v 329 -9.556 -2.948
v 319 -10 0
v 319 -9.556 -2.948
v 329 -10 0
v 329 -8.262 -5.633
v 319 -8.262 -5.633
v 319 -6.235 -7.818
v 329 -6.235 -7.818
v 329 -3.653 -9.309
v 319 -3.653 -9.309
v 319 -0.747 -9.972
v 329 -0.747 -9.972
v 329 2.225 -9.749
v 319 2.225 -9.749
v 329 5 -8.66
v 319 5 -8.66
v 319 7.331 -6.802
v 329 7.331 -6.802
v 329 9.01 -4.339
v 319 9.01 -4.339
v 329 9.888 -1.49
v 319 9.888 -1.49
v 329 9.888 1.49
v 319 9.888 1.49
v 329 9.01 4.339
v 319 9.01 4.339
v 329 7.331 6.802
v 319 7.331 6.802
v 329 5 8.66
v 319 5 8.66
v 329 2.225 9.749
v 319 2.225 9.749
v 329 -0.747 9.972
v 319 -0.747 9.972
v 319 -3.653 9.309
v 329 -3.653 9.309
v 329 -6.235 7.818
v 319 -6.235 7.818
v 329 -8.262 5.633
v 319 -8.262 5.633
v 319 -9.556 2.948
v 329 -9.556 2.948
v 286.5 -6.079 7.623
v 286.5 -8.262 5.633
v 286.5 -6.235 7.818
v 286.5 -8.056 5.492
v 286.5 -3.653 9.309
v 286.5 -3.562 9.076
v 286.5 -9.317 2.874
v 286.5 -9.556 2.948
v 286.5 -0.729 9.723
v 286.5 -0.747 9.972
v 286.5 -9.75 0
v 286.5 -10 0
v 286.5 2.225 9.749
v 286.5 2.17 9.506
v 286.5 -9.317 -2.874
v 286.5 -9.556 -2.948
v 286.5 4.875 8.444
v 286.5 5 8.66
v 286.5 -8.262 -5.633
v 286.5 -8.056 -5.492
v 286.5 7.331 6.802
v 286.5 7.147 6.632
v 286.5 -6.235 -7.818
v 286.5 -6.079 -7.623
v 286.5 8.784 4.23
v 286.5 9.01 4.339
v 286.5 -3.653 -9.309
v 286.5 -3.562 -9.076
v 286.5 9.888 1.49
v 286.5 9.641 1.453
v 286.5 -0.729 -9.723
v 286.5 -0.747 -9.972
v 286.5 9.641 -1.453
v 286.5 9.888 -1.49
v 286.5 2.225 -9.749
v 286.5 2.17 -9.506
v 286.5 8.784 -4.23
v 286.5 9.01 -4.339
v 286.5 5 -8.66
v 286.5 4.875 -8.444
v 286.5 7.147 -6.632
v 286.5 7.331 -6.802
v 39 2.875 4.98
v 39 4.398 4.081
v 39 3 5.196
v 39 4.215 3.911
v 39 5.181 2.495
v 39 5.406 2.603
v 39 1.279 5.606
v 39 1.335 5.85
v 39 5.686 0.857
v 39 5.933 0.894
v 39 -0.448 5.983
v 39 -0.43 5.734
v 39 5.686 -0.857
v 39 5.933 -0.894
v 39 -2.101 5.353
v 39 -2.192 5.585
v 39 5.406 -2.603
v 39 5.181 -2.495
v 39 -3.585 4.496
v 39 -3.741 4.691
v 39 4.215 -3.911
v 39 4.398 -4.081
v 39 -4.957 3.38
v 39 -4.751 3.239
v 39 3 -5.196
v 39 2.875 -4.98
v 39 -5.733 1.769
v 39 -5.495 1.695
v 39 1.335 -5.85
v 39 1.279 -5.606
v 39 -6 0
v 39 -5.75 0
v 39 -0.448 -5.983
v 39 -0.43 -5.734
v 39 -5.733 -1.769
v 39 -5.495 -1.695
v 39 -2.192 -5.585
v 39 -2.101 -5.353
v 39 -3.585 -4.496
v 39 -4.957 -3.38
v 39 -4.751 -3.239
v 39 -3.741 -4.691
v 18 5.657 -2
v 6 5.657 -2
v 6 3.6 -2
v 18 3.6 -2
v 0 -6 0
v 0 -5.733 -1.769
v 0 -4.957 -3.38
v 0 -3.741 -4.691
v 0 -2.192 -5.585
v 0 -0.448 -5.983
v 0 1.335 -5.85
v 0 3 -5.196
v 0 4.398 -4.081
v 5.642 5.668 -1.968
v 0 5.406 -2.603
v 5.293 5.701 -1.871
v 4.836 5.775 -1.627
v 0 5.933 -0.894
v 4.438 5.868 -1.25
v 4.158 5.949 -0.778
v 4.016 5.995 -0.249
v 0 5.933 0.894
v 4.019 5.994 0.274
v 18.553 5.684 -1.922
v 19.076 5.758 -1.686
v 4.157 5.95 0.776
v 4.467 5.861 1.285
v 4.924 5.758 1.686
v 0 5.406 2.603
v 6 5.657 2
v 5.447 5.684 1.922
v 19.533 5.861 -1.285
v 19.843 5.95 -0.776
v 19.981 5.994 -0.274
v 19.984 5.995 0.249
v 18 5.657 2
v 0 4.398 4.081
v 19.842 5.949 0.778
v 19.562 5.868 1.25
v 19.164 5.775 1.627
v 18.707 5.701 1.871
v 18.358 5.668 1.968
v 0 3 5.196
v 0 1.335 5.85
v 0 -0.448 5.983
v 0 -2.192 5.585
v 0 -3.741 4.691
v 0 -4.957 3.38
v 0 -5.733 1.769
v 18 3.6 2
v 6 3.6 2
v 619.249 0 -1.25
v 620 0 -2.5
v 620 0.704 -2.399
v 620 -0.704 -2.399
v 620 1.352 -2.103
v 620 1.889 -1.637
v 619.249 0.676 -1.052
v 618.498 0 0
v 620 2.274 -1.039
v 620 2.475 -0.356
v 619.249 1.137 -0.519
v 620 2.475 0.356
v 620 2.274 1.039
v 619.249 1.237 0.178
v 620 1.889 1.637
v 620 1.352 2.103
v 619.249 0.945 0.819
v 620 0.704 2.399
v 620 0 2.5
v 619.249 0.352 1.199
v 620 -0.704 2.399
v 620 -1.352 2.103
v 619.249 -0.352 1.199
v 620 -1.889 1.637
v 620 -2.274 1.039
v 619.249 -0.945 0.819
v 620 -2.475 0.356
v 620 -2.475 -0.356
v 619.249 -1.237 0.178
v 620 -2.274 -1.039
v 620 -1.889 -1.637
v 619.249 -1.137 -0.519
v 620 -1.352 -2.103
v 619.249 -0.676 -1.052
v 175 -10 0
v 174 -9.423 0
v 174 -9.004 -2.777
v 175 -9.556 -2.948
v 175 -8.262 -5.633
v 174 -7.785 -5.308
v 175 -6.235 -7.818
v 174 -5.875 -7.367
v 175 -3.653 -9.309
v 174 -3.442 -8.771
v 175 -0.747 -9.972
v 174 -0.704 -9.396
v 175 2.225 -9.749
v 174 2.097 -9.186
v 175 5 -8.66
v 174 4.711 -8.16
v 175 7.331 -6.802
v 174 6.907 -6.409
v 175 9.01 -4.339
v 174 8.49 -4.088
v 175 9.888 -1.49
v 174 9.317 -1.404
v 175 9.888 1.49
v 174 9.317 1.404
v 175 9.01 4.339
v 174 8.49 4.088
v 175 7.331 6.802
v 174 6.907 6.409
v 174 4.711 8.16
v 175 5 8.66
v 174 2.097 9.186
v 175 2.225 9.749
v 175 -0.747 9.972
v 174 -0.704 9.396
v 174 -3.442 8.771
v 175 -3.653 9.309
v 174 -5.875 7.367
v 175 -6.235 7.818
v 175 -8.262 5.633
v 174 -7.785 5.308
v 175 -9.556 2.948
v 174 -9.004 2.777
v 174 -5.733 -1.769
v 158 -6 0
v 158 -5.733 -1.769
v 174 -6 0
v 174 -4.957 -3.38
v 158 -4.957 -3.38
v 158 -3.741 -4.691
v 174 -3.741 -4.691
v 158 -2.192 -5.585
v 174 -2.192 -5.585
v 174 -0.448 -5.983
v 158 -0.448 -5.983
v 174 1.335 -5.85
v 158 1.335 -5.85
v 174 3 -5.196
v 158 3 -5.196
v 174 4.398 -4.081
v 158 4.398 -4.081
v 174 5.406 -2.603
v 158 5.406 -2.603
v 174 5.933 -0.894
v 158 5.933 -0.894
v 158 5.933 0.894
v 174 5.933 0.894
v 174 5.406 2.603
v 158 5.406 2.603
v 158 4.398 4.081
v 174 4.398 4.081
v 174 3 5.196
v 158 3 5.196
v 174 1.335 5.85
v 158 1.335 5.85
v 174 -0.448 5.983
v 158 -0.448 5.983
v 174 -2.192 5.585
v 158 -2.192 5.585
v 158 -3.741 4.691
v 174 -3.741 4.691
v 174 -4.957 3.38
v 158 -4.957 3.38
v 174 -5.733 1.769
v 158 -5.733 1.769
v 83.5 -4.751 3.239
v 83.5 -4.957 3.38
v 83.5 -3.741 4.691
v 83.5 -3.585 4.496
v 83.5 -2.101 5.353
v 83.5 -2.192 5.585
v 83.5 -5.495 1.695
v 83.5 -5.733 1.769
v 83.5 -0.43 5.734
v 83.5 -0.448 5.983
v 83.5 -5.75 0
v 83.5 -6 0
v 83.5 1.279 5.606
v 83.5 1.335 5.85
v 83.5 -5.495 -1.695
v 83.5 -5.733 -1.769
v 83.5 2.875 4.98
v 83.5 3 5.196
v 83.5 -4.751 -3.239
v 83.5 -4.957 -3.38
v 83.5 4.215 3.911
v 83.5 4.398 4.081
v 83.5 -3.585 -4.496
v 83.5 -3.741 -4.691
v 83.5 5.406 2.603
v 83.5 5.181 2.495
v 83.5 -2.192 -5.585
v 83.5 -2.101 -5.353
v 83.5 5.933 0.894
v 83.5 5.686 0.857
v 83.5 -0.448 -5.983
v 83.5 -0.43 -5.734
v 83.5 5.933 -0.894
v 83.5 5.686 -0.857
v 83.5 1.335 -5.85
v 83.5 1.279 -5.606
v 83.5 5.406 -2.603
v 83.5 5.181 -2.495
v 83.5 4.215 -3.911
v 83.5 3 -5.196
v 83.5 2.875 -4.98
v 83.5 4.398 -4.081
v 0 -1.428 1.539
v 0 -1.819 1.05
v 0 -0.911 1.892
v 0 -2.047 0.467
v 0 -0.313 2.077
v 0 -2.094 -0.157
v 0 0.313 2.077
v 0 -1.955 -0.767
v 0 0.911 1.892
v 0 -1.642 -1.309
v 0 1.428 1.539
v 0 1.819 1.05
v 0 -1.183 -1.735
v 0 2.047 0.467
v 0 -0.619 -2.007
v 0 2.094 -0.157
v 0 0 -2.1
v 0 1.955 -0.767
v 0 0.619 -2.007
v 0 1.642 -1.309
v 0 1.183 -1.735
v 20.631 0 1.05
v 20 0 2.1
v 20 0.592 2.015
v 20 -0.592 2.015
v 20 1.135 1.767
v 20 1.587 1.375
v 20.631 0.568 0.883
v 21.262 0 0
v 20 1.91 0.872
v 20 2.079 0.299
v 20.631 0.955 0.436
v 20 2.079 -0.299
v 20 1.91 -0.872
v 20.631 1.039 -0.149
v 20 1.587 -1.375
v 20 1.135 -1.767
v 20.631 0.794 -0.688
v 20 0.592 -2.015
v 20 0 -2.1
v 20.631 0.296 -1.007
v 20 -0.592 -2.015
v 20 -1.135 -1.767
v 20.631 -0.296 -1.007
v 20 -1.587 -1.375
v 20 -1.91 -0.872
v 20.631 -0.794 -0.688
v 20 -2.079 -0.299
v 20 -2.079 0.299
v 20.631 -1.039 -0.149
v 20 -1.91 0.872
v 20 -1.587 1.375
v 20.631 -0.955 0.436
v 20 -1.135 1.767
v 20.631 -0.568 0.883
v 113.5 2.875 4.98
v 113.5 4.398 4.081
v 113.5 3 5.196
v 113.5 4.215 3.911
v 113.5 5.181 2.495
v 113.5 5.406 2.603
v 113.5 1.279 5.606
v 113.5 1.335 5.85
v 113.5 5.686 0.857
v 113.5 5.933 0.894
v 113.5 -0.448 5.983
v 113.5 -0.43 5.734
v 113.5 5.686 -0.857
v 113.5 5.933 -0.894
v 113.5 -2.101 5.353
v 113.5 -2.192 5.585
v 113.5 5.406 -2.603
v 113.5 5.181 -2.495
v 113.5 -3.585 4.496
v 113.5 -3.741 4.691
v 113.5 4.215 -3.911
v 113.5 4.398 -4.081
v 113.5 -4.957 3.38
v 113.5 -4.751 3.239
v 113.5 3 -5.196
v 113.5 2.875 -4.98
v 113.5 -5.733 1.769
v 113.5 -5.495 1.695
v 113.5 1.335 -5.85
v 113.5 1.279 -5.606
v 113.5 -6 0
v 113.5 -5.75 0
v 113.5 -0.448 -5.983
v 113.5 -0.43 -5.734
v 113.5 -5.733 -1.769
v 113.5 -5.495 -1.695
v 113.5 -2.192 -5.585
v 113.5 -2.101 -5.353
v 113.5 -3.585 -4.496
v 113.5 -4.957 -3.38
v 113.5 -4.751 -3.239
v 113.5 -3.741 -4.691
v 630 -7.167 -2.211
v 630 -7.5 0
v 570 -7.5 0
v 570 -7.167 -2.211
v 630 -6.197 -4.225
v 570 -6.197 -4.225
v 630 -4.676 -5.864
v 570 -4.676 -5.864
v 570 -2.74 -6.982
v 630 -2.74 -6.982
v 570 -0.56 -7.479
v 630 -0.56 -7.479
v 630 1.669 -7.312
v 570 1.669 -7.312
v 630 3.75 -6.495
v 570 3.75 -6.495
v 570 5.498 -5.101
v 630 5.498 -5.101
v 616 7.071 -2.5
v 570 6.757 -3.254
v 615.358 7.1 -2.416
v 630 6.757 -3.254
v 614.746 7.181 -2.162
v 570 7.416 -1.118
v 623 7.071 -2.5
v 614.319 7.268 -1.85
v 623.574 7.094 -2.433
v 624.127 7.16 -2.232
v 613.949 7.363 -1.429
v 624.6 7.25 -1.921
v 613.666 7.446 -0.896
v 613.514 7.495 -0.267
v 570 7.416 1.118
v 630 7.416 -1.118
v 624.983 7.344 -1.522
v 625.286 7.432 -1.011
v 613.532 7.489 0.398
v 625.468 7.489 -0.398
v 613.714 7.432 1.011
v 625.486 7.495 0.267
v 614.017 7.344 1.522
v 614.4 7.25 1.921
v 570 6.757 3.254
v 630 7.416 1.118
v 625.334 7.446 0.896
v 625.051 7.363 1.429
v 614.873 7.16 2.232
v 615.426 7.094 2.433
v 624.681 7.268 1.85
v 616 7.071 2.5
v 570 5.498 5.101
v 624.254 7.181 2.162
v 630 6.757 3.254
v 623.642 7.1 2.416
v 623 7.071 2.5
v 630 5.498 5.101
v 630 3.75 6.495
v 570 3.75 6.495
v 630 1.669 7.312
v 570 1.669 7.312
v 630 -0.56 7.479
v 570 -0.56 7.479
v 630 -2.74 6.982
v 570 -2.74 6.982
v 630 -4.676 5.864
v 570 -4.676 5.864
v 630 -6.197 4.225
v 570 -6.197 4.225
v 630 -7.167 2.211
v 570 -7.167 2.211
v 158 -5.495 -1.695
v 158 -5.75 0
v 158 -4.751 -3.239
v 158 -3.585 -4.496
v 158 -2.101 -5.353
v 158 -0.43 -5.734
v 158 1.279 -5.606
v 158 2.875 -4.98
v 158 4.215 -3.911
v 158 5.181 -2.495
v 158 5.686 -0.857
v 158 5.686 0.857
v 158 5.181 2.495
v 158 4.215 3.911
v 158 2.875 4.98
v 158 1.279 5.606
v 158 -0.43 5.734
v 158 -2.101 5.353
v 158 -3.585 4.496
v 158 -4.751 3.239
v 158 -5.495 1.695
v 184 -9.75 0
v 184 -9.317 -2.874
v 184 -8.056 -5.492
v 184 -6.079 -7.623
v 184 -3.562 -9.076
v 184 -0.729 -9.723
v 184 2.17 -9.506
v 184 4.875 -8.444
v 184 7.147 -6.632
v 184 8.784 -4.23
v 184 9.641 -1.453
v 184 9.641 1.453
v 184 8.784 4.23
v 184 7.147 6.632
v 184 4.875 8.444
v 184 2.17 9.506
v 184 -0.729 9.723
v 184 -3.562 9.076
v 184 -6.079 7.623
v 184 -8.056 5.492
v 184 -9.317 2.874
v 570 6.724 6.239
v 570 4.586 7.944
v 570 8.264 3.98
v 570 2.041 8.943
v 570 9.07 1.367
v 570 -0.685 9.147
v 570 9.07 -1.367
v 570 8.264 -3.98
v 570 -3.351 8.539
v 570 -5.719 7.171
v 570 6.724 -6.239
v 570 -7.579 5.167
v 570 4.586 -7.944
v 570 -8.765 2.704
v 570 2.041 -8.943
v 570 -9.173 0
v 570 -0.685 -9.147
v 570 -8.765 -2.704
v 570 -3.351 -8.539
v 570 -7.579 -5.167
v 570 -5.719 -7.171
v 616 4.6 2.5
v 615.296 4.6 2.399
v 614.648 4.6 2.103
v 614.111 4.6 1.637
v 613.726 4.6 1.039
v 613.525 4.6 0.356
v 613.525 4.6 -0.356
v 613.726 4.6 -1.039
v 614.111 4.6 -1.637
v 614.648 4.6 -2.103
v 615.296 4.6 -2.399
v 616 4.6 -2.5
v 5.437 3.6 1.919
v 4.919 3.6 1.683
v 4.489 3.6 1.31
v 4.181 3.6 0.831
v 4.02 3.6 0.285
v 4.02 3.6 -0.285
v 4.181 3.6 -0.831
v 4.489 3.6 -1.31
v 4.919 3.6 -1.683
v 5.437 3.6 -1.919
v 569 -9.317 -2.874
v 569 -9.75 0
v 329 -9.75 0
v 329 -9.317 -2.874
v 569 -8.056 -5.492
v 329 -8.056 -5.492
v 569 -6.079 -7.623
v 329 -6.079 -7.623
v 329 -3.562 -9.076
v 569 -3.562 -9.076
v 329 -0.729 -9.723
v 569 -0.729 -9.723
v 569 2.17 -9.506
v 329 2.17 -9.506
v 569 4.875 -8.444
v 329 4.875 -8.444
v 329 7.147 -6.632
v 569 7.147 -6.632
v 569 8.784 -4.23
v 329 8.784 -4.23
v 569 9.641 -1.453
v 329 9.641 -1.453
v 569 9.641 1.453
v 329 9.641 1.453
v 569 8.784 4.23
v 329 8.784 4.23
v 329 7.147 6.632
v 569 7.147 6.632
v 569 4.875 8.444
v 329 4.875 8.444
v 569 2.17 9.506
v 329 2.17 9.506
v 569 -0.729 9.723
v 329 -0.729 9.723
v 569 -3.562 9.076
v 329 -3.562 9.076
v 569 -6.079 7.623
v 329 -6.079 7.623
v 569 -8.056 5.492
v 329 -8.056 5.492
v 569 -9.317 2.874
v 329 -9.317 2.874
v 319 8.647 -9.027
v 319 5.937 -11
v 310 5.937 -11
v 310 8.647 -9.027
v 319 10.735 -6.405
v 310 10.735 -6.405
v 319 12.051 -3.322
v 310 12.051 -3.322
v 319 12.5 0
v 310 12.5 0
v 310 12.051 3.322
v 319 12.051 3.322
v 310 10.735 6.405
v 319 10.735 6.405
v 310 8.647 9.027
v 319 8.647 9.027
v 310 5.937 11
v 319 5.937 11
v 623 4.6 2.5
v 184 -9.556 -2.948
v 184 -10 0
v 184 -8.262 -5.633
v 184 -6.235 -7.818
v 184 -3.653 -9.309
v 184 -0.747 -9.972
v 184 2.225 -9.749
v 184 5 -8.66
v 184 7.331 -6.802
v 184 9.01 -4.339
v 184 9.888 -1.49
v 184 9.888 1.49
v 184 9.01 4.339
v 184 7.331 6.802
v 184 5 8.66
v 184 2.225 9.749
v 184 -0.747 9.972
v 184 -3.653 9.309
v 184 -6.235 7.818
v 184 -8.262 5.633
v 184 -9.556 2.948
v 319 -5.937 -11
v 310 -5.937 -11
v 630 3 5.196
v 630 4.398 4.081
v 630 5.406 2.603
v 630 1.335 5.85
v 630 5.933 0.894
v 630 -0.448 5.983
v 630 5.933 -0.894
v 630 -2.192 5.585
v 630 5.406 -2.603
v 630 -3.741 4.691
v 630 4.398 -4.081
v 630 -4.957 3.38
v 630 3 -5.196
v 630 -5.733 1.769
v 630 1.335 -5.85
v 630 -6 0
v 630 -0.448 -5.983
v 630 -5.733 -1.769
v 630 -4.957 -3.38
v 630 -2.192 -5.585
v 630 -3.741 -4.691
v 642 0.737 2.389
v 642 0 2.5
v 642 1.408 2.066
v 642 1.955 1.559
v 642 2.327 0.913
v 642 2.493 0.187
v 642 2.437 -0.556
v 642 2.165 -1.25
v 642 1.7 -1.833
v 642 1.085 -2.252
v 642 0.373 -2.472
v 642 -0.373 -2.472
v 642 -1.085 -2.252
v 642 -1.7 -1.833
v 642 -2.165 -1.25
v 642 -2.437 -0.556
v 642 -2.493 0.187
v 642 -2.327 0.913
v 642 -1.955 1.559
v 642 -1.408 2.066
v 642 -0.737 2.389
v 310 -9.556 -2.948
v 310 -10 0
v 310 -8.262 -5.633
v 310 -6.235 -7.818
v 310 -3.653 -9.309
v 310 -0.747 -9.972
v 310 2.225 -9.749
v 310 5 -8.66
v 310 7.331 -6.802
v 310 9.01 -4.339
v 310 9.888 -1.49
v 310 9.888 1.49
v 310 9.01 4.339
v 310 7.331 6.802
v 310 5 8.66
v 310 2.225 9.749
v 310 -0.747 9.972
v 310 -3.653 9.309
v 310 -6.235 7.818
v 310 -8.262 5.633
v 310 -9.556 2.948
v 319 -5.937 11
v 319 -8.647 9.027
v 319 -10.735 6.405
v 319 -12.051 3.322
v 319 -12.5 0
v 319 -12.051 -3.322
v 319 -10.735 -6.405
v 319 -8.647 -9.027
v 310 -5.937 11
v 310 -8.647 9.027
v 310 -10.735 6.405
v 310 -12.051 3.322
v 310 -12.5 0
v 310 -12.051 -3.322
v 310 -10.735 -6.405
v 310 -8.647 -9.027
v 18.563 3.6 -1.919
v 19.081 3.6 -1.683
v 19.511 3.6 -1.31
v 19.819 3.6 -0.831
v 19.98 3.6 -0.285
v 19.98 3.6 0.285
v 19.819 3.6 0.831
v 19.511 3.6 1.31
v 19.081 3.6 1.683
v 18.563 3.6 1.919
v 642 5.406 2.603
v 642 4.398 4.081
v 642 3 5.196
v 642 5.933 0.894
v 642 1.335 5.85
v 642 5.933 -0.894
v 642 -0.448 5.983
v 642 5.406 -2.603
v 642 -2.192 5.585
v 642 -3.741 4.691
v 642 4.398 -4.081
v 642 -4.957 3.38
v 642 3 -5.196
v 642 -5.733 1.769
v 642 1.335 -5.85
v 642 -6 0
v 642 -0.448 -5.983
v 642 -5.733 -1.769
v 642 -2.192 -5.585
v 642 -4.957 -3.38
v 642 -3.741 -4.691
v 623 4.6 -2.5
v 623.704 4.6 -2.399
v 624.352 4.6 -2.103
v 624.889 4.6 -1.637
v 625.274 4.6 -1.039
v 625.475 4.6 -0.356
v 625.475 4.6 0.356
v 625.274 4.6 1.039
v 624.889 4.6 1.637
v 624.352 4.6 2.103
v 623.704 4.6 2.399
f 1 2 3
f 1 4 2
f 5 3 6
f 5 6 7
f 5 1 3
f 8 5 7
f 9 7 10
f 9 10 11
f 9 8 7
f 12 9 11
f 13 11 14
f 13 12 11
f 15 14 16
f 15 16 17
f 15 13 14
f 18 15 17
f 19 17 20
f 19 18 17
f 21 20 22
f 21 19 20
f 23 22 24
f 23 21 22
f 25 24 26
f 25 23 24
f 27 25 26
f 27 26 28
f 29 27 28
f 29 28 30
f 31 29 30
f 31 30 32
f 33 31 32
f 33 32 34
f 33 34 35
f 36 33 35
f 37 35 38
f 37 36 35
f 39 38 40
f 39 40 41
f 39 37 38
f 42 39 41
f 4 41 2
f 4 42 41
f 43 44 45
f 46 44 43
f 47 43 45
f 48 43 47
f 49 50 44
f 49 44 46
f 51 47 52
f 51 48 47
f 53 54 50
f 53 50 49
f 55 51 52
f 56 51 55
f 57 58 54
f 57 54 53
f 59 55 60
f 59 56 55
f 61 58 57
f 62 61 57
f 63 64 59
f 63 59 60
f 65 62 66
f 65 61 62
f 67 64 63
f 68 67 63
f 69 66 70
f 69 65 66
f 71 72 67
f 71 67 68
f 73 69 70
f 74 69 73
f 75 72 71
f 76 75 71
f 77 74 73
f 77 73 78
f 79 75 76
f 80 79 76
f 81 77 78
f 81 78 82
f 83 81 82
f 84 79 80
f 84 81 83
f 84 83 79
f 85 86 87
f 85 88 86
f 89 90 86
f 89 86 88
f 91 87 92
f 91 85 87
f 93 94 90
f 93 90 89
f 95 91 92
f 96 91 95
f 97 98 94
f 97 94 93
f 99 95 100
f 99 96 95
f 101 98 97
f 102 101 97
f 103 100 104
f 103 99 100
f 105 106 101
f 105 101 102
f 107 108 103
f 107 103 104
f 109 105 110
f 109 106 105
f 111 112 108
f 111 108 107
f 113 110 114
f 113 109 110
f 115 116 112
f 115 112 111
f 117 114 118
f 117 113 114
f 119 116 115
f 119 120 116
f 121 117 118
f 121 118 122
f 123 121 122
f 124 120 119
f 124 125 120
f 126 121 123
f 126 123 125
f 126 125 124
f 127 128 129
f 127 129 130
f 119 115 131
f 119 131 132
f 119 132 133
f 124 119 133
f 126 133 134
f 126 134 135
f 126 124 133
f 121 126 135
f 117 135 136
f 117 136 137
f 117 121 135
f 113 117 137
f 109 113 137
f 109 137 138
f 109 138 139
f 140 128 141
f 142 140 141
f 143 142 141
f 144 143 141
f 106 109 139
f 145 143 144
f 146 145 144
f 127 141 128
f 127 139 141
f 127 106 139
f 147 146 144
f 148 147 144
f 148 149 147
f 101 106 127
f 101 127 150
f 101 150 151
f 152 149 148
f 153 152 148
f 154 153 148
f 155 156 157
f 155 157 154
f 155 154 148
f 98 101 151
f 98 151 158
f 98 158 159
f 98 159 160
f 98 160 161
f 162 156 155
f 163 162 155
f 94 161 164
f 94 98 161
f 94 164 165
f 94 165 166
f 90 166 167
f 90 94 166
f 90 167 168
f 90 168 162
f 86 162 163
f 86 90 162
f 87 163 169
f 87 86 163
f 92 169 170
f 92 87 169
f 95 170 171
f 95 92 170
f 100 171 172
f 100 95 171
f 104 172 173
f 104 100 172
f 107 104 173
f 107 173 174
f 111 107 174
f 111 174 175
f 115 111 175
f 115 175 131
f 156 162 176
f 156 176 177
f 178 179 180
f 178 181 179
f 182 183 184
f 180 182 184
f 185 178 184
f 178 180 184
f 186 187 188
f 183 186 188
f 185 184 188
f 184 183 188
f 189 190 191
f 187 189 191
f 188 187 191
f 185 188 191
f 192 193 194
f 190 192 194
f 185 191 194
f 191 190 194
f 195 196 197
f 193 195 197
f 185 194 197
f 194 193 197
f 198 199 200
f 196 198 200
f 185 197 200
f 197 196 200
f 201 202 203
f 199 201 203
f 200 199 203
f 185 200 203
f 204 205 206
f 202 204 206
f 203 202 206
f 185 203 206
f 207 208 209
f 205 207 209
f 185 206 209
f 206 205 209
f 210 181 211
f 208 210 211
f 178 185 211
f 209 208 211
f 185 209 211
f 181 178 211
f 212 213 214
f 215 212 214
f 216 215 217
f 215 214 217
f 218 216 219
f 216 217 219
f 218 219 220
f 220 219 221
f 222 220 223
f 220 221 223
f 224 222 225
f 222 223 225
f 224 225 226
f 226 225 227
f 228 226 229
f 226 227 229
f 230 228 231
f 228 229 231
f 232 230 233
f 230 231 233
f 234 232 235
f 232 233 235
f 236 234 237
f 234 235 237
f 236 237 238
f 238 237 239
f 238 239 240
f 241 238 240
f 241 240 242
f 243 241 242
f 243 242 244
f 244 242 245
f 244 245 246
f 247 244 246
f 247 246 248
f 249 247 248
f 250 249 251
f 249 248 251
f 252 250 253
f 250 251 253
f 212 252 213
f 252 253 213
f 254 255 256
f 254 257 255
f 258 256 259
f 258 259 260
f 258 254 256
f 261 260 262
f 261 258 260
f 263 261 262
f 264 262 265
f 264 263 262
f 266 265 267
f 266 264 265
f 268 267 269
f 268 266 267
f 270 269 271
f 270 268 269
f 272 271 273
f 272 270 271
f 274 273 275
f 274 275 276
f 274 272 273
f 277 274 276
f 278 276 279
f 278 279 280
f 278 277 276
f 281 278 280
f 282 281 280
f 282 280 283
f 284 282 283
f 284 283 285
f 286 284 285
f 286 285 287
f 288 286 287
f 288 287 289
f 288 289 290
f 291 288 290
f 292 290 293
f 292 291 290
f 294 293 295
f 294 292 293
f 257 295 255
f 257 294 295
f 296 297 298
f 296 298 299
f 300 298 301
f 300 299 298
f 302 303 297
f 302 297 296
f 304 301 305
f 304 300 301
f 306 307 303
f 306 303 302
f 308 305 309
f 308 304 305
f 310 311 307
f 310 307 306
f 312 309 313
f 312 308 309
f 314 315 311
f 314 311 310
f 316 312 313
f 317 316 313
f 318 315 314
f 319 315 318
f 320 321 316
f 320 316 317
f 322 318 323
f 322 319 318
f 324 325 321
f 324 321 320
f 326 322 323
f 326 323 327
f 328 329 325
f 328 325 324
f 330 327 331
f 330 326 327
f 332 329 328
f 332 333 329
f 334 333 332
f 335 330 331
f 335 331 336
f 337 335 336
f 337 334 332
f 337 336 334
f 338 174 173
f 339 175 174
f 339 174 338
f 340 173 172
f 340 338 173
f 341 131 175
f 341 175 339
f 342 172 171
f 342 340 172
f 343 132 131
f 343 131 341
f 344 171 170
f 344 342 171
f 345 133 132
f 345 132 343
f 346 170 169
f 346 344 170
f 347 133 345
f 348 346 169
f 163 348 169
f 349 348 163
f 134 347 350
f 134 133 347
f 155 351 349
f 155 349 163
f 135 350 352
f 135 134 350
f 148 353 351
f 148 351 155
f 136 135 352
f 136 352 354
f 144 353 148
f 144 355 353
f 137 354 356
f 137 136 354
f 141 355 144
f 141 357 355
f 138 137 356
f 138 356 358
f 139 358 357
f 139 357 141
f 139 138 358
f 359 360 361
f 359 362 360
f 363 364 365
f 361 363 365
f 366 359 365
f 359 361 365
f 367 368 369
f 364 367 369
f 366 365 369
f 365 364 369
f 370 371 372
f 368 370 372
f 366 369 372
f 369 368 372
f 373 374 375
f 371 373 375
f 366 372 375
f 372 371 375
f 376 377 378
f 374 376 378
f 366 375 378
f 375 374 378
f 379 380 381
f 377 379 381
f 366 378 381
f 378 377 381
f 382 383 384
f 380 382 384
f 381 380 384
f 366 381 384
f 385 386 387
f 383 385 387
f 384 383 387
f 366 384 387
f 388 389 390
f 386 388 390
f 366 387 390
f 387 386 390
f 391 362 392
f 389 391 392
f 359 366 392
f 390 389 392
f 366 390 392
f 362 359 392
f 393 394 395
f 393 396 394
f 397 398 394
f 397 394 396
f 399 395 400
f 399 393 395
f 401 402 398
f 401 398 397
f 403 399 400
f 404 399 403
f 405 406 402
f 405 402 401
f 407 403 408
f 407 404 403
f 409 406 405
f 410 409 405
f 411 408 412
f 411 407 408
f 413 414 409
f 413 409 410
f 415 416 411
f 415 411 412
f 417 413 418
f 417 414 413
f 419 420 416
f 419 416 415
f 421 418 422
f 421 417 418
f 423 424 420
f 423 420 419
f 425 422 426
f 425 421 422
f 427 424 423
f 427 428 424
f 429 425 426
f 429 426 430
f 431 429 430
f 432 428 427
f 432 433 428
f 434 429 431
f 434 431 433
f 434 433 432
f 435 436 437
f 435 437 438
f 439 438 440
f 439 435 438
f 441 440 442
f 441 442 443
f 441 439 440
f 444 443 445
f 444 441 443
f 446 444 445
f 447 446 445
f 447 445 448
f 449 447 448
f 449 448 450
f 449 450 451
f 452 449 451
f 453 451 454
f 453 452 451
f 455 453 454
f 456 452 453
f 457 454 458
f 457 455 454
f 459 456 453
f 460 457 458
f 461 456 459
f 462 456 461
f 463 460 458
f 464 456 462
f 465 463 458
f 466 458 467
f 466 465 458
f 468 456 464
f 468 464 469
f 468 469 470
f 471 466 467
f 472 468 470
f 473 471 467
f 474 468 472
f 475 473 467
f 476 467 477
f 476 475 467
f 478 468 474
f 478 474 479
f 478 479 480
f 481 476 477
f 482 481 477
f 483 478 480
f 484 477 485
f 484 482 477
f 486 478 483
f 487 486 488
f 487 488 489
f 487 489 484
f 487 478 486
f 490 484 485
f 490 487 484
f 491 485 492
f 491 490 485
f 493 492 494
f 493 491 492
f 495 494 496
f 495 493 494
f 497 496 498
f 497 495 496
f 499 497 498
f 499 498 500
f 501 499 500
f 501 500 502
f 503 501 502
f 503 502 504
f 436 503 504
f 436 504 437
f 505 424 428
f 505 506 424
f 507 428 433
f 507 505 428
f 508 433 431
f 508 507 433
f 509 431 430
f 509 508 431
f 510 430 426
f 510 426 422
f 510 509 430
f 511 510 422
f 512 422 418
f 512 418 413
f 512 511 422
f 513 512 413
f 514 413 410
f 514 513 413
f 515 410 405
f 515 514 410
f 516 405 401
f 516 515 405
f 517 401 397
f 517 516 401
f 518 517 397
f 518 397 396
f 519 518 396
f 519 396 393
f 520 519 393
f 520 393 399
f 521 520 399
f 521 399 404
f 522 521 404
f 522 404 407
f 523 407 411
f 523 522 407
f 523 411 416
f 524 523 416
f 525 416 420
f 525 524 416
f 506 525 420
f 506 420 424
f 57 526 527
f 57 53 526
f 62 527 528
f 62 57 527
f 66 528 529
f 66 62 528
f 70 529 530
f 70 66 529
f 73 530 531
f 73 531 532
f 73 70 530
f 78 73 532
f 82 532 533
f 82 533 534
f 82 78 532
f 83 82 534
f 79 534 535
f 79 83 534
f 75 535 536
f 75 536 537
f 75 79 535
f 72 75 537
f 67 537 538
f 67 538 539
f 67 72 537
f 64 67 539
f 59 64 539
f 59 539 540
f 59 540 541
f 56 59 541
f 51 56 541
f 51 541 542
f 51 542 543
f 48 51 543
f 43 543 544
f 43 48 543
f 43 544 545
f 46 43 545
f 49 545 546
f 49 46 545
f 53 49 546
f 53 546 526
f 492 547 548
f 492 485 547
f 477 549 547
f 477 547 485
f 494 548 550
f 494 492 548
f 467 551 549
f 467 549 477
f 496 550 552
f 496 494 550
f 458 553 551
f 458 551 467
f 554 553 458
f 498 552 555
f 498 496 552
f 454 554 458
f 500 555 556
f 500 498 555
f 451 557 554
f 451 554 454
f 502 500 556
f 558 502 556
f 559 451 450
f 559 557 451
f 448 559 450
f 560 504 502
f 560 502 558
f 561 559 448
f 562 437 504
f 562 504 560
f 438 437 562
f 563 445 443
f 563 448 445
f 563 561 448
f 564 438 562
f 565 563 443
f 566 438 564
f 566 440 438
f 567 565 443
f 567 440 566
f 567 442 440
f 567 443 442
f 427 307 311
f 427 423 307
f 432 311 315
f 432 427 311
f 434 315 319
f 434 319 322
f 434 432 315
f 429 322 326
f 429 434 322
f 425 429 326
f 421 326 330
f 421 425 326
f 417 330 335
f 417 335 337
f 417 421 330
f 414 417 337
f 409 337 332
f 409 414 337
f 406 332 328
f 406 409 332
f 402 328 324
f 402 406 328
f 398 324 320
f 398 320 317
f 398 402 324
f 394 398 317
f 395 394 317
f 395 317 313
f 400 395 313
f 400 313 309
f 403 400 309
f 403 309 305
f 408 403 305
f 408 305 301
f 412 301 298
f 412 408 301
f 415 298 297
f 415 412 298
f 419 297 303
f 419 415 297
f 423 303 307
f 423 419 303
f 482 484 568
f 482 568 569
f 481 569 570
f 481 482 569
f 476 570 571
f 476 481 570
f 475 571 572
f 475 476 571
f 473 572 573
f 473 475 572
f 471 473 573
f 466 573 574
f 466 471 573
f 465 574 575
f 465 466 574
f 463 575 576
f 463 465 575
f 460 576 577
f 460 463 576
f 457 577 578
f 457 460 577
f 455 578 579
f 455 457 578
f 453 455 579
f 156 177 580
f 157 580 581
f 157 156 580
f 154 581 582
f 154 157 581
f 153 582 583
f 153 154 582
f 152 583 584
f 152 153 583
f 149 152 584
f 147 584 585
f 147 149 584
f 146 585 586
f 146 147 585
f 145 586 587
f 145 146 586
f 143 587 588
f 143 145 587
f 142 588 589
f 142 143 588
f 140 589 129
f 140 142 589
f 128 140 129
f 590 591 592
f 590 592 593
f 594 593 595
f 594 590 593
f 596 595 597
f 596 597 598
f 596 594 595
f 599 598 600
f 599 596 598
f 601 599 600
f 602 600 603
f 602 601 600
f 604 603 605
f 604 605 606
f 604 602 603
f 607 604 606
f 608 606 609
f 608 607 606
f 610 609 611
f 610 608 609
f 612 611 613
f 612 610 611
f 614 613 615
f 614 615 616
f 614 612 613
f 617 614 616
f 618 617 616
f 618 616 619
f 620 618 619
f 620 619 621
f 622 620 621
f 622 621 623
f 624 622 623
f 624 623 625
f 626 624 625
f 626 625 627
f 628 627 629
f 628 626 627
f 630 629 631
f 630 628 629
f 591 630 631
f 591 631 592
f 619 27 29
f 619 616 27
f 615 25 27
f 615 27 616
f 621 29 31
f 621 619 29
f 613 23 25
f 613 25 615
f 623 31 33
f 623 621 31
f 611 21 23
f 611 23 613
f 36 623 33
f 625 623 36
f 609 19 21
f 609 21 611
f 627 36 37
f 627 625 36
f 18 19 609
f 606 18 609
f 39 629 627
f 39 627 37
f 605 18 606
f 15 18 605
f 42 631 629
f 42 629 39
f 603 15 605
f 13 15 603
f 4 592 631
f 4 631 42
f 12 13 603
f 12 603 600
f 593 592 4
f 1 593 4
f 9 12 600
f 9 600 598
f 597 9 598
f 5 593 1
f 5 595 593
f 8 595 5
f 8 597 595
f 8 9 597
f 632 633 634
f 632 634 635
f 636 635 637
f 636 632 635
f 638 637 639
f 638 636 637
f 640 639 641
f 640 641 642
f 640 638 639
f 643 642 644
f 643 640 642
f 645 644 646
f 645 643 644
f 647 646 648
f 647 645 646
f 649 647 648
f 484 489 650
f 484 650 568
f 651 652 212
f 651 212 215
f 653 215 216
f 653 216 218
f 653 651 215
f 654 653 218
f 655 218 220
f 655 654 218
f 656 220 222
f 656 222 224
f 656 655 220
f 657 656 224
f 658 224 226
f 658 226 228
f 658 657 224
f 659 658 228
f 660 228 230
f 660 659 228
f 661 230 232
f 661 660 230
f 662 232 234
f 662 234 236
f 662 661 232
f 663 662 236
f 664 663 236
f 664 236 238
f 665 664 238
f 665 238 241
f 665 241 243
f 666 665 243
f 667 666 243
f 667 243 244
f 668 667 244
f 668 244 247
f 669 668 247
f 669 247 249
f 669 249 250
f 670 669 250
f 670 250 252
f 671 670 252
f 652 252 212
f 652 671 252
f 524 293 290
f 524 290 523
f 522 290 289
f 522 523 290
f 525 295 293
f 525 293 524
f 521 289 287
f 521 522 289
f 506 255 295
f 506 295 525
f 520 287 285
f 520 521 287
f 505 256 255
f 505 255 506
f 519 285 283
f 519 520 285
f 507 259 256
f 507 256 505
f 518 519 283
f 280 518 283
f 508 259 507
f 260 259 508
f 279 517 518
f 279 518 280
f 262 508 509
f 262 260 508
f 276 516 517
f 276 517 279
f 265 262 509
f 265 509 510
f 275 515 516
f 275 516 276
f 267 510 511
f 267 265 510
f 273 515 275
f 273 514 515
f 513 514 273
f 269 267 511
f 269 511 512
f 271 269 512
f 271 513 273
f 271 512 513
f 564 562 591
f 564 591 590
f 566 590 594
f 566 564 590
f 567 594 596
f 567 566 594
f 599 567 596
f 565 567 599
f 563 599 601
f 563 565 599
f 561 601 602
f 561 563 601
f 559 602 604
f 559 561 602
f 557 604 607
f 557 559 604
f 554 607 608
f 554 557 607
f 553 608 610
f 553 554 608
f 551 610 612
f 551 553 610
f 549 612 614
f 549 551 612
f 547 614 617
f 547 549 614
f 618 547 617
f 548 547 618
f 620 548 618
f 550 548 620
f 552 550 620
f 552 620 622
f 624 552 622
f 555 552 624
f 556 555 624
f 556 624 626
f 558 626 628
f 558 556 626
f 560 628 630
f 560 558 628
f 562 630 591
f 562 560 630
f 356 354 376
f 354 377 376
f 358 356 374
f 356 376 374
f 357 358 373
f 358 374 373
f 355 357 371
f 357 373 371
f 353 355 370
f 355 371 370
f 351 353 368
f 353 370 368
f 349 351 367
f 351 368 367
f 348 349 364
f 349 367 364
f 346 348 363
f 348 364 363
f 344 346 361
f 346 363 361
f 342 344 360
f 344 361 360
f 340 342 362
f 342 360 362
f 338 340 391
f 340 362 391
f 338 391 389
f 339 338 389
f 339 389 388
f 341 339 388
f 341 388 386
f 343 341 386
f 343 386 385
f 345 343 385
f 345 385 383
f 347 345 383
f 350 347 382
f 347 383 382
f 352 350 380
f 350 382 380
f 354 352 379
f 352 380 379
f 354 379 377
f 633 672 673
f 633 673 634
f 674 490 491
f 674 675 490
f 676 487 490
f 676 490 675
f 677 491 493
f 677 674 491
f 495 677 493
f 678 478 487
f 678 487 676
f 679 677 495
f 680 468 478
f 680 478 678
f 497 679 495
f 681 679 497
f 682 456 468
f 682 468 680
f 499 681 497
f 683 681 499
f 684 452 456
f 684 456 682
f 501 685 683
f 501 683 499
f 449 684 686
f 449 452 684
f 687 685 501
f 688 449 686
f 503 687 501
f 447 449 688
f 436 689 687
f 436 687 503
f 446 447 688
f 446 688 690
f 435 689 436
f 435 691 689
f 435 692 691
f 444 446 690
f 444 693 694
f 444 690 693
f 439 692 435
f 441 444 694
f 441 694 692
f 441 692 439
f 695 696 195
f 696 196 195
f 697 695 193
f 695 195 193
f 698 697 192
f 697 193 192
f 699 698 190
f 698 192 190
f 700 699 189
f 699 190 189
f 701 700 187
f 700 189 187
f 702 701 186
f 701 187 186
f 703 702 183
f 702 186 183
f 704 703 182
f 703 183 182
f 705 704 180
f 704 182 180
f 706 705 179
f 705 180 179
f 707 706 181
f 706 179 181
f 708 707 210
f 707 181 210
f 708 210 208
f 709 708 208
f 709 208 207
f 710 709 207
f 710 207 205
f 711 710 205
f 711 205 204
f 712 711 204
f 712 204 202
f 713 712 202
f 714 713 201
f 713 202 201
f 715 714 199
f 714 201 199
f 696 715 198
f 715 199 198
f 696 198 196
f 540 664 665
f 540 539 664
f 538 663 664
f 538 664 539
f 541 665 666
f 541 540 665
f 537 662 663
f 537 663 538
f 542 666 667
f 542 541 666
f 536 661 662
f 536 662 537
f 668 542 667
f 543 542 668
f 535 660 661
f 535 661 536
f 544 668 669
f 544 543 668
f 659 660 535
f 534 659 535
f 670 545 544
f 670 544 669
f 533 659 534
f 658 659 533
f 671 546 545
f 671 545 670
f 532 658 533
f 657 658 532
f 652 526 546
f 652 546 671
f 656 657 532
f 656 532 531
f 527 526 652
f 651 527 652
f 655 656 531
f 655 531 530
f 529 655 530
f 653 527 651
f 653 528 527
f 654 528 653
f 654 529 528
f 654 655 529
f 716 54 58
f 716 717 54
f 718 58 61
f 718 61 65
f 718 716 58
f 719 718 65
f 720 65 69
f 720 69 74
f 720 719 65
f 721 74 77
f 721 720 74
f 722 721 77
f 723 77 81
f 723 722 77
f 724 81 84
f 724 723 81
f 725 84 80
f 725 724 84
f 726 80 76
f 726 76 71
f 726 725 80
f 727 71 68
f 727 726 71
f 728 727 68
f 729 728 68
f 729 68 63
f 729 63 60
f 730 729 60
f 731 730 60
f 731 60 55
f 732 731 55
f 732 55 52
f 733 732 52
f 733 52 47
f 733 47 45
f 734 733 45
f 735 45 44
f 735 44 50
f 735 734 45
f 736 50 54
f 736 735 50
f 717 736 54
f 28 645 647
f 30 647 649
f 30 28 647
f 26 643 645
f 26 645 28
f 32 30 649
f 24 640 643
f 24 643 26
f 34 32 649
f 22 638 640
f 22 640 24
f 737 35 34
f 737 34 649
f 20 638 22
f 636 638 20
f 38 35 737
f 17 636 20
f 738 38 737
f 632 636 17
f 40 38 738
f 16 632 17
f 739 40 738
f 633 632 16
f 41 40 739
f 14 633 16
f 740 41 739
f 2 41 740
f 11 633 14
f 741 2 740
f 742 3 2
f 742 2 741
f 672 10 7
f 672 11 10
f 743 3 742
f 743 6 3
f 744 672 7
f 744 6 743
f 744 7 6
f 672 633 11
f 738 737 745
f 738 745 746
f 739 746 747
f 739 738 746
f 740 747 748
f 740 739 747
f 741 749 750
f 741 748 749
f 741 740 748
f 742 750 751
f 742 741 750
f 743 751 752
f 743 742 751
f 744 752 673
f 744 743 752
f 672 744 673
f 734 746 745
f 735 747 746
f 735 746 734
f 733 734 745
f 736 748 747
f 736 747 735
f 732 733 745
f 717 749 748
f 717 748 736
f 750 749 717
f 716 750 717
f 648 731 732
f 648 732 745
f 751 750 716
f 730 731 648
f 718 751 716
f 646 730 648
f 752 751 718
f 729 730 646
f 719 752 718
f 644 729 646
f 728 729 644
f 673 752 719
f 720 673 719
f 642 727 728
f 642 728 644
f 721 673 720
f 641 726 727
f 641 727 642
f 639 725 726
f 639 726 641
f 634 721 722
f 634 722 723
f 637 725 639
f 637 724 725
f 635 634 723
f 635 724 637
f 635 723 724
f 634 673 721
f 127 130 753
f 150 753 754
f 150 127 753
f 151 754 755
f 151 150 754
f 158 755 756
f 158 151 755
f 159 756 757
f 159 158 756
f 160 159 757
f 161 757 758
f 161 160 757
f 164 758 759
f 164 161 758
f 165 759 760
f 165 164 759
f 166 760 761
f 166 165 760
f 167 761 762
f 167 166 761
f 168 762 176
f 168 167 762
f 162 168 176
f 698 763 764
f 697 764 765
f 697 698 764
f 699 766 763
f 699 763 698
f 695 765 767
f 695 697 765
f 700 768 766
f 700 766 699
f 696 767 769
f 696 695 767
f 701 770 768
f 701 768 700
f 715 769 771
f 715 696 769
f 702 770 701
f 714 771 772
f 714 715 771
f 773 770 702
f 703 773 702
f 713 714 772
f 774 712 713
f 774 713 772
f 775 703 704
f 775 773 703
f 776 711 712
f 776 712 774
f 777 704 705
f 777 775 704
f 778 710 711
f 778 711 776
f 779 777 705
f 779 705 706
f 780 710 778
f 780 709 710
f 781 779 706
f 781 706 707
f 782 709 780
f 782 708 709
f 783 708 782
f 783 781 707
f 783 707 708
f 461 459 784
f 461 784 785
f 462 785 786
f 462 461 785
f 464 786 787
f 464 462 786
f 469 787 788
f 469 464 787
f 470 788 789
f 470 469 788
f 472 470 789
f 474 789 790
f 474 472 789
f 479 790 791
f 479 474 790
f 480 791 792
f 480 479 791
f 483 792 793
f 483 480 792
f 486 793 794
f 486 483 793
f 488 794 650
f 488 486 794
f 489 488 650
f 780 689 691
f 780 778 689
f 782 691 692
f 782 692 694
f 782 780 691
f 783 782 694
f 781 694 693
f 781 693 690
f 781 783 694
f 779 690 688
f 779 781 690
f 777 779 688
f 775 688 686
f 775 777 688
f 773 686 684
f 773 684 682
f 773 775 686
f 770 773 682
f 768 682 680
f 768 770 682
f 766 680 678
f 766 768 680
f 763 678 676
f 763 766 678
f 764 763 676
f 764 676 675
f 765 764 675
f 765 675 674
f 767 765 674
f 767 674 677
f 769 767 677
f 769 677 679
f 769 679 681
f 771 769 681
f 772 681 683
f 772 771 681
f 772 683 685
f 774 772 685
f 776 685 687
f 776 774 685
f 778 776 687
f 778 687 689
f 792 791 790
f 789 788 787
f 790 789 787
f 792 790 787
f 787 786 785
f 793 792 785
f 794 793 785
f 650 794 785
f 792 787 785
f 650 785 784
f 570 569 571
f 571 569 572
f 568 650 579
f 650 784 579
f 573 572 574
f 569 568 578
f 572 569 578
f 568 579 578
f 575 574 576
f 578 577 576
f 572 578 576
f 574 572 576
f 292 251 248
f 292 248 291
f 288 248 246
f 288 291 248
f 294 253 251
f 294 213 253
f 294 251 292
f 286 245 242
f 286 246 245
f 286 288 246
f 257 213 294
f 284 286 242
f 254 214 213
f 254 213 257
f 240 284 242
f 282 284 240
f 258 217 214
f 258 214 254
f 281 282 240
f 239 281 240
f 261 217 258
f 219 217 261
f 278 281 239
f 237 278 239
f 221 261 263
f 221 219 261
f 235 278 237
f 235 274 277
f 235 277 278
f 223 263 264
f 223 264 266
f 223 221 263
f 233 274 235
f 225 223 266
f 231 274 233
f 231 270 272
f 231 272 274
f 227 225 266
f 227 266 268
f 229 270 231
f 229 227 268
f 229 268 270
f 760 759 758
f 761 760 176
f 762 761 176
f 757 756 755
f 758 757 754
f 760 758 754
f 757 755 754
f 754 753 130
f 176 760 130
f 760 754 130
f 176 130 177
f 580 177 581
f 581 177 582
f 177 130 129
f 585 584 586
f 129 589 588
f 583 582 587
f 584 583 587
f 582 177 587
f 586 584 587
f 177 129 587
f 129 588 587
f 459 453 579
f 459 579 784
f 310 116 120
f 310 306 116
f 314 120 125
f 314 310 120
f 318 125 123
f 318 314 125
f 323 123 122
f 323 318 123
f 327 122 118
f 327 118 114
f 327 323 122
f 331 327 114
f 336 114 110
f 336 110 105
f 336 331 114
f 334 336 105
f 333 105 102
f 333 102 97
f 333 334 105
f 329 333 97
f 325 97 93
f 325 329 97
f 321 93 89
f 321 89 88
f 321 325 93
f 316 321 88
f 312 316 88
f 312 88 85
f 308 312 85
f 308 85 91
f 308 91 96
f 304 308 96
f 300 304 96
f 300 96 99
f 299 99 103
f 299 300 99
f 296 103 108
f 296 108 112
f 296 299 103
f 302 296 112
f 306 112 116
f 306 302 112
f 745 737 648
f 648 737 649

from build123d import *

# Parameters (mm, degrees)
ODEBRAT_VYSUNUT_M1_DEPTH = 2.4
ODEBRAT_VYSUNUT_M2_DEPTH = 2.9
SKICA4_W                 = 43.201709197
SKICA4_H                 = 57.022390215
SKICA4_W_2               = 28.704491345
SKICA4_H_2               = 62.531332999
ODEBRAT_VYSUNUT_M3_DEPTH = 320.0000001
M6_Z_VIT1_D              = 5
M6_Z_VIT1_DEPTH          = 22
M6_Z_VIT1_TIP            = 1.502151548
M5_Z_VIT1_D              = 4.2
M5_Z_VIT1_DEPTH          = 20
M5_Z_VIT1_TIP            = 1.2618073
ZKOSEN_1_SIZE            = 1
ZKOSEN_1_SIZE2           = 0.577350269
ZKOSEN_1_PART_2_SIZE     = 1
ZKOSEN_1_PART_2_SIZE2    = 0.577350269


with BuildPart() as part:
    # Skica1 → Rotovat1 (revolve)
    with BuildSketch(Plane.XY, mode=Mode.PRIVATE) as rotovat1_sk:
        Polygon((0, 0), (0, 6), (39, 6), (39, 5.75), (83.5, 5.75), (83.5, 6), (113.5, 6), (113.5, 5.75), (158, 5.75), (158, 6), (174, 6), (174, 10), (184, 10), (184, 9.75), (286.5, 9.75), (286.5, 10), (310, 10), (310, 12.5), (319, 12.5), (319, 10), (329, 10), (329, 9.75), (570, 9.75), (570, 7.5), (630, 7.5), (630, 6), (642, 6), (642, 0), align=None)
    revolve(rotovat1_sk.sketch.rotate(Axis((-5427.299905209, 0, 0), (1, 0, 0)), 180), axis=Axis((-5427.299905209, 0, 0), (1, 0, 0)))  # turned: the seam where the file's is

    # Skica2 → Odebrat vysunutím1 (cut)
    with BuildSketch(Plane(origin=(0, 6, 0), x_dir=(1, 0, 0), z_dir=(0, 1, 0))):
        with BuildLine():
            Line((6, 2), (18, 2))
            ThreePointArc((18, 2), (20, 0), (18, -2))
            Line((18, -2), (6, -2))
            ThreePointArc((6, -2), (4, 0), (6, 2))
        make_face()
    extrude(amount=-ODEBRAT_VYSUNUT_M1_DEPTH, mode=Mode.SUBTRACT)

    # Skica3 → Odebrat vysunutím2 (cut)
    with BuildSketch(Plane(origin=(0, 7.5, 0), x_dir=(1, 0, 0), z_dir=(0, 1, 0))):
        with BuildLine():
            Line((616, 2.5), (623, 2.5))
            ThreePointArc((623, 2.5), (625.5, 0), (623, -2.5))
            Line((623, -2.5), (616, -2.5))
            ThreePointArc((616, -2.5), (613.5, 0), (616, 2.5))
        make_face()
    extrude(amount=-ODEBRAT_VYSUNUT_M2_DEPTH, mode=Mode.SUBTRACT)

    # Skica4 → Odebrat vysunutím3 (cut, through all)
    with BuildSketch(Plane(origin=(319, 0, 0), x_dir=(0, 0, -1), z_dir=(1, 0, 0))):
        with Locations((-32.600854599, -5.674005363)):
            Rectangle(SKICA4_W, SKICA4_H)
        with Locations((25.352245673, -4.175959518)):
            Rectangle(SKICA4_W_2, SKICA4_H_2)
    extrude(amount=-ODEBRAT_VYSUNUT_M3_DEPTH, mode=Mode.SUBTRACT)

    # M6 závit1
    with Locations(Plane(origin=(642, 0, 0), x_dir=(0, 0, -1), z_dir=(1, 0, 0))):
        with Locations((0, 0)):
            Hole(M6_Z_VIT1_D / 2, depth=M6_Z_VIT1_DEPTH)
            with Locations((0, 0, -(M6_Z_VIT1_DEPTH + M6_Z_VIT1_TIP / 2))):  # 118° drill point
                Cone(0, M6_Z_VIT1_D / 2, M6_Z_VIT1_TIP, mode=Mode.SUBTRACT)

    # M5 závit1
    with Locations(Plane.ZY):
        with Locations((0, 0)):
            Hole(M5_Z_VIT1_D / 2, depth=M5_Z_VIT1_DEPTH)
            with Locations((0, 0, -(M5_Z_VIT1_DEPTH + M5_Z_VIT1_TIP / 2))):  # 118° drill point
                Cone(0, M5_Z_VIT1_D / 2, M5_Z_VIT1_TIP, mode=Mode.SUBTRACT)

    # Zkosení1
    zkosen_1_edges = [part.edges().sort_by_distance(p)[0] for p in [
        (570, 9.75, 0),
    ]]
    zkosen_1_side = [part.faces().sort_by_distance(p)[0] for p in [
        (449.5, 9.75, 0),
    ]]
    chamfer(zkosen_1_edges, length=ZKOSEN_1_SIZE, length2=ZKOSEN_1_SIZE2, reference=zkosen_1_side[0])

    # Zkosení1 part 2
    zkosen_1_part_2_edges = [part.edges().sort_by_distance(p)[0] for p in [
        (174, 10, 0),
    ]]
    zkosen_1_part_2_side = [part.faces().sort_by_distance(p)[0] for p in [
        (179, 10, 0),
    ]]
    chamfer(zkosen_1_part_2_edges, length=ZKOSEN_1_PART_2_SIZE, length2=ZKOSEN_1_PART_2_SIZE2, reference=zkosen_1_part_2_side[0])


solid = part.part
